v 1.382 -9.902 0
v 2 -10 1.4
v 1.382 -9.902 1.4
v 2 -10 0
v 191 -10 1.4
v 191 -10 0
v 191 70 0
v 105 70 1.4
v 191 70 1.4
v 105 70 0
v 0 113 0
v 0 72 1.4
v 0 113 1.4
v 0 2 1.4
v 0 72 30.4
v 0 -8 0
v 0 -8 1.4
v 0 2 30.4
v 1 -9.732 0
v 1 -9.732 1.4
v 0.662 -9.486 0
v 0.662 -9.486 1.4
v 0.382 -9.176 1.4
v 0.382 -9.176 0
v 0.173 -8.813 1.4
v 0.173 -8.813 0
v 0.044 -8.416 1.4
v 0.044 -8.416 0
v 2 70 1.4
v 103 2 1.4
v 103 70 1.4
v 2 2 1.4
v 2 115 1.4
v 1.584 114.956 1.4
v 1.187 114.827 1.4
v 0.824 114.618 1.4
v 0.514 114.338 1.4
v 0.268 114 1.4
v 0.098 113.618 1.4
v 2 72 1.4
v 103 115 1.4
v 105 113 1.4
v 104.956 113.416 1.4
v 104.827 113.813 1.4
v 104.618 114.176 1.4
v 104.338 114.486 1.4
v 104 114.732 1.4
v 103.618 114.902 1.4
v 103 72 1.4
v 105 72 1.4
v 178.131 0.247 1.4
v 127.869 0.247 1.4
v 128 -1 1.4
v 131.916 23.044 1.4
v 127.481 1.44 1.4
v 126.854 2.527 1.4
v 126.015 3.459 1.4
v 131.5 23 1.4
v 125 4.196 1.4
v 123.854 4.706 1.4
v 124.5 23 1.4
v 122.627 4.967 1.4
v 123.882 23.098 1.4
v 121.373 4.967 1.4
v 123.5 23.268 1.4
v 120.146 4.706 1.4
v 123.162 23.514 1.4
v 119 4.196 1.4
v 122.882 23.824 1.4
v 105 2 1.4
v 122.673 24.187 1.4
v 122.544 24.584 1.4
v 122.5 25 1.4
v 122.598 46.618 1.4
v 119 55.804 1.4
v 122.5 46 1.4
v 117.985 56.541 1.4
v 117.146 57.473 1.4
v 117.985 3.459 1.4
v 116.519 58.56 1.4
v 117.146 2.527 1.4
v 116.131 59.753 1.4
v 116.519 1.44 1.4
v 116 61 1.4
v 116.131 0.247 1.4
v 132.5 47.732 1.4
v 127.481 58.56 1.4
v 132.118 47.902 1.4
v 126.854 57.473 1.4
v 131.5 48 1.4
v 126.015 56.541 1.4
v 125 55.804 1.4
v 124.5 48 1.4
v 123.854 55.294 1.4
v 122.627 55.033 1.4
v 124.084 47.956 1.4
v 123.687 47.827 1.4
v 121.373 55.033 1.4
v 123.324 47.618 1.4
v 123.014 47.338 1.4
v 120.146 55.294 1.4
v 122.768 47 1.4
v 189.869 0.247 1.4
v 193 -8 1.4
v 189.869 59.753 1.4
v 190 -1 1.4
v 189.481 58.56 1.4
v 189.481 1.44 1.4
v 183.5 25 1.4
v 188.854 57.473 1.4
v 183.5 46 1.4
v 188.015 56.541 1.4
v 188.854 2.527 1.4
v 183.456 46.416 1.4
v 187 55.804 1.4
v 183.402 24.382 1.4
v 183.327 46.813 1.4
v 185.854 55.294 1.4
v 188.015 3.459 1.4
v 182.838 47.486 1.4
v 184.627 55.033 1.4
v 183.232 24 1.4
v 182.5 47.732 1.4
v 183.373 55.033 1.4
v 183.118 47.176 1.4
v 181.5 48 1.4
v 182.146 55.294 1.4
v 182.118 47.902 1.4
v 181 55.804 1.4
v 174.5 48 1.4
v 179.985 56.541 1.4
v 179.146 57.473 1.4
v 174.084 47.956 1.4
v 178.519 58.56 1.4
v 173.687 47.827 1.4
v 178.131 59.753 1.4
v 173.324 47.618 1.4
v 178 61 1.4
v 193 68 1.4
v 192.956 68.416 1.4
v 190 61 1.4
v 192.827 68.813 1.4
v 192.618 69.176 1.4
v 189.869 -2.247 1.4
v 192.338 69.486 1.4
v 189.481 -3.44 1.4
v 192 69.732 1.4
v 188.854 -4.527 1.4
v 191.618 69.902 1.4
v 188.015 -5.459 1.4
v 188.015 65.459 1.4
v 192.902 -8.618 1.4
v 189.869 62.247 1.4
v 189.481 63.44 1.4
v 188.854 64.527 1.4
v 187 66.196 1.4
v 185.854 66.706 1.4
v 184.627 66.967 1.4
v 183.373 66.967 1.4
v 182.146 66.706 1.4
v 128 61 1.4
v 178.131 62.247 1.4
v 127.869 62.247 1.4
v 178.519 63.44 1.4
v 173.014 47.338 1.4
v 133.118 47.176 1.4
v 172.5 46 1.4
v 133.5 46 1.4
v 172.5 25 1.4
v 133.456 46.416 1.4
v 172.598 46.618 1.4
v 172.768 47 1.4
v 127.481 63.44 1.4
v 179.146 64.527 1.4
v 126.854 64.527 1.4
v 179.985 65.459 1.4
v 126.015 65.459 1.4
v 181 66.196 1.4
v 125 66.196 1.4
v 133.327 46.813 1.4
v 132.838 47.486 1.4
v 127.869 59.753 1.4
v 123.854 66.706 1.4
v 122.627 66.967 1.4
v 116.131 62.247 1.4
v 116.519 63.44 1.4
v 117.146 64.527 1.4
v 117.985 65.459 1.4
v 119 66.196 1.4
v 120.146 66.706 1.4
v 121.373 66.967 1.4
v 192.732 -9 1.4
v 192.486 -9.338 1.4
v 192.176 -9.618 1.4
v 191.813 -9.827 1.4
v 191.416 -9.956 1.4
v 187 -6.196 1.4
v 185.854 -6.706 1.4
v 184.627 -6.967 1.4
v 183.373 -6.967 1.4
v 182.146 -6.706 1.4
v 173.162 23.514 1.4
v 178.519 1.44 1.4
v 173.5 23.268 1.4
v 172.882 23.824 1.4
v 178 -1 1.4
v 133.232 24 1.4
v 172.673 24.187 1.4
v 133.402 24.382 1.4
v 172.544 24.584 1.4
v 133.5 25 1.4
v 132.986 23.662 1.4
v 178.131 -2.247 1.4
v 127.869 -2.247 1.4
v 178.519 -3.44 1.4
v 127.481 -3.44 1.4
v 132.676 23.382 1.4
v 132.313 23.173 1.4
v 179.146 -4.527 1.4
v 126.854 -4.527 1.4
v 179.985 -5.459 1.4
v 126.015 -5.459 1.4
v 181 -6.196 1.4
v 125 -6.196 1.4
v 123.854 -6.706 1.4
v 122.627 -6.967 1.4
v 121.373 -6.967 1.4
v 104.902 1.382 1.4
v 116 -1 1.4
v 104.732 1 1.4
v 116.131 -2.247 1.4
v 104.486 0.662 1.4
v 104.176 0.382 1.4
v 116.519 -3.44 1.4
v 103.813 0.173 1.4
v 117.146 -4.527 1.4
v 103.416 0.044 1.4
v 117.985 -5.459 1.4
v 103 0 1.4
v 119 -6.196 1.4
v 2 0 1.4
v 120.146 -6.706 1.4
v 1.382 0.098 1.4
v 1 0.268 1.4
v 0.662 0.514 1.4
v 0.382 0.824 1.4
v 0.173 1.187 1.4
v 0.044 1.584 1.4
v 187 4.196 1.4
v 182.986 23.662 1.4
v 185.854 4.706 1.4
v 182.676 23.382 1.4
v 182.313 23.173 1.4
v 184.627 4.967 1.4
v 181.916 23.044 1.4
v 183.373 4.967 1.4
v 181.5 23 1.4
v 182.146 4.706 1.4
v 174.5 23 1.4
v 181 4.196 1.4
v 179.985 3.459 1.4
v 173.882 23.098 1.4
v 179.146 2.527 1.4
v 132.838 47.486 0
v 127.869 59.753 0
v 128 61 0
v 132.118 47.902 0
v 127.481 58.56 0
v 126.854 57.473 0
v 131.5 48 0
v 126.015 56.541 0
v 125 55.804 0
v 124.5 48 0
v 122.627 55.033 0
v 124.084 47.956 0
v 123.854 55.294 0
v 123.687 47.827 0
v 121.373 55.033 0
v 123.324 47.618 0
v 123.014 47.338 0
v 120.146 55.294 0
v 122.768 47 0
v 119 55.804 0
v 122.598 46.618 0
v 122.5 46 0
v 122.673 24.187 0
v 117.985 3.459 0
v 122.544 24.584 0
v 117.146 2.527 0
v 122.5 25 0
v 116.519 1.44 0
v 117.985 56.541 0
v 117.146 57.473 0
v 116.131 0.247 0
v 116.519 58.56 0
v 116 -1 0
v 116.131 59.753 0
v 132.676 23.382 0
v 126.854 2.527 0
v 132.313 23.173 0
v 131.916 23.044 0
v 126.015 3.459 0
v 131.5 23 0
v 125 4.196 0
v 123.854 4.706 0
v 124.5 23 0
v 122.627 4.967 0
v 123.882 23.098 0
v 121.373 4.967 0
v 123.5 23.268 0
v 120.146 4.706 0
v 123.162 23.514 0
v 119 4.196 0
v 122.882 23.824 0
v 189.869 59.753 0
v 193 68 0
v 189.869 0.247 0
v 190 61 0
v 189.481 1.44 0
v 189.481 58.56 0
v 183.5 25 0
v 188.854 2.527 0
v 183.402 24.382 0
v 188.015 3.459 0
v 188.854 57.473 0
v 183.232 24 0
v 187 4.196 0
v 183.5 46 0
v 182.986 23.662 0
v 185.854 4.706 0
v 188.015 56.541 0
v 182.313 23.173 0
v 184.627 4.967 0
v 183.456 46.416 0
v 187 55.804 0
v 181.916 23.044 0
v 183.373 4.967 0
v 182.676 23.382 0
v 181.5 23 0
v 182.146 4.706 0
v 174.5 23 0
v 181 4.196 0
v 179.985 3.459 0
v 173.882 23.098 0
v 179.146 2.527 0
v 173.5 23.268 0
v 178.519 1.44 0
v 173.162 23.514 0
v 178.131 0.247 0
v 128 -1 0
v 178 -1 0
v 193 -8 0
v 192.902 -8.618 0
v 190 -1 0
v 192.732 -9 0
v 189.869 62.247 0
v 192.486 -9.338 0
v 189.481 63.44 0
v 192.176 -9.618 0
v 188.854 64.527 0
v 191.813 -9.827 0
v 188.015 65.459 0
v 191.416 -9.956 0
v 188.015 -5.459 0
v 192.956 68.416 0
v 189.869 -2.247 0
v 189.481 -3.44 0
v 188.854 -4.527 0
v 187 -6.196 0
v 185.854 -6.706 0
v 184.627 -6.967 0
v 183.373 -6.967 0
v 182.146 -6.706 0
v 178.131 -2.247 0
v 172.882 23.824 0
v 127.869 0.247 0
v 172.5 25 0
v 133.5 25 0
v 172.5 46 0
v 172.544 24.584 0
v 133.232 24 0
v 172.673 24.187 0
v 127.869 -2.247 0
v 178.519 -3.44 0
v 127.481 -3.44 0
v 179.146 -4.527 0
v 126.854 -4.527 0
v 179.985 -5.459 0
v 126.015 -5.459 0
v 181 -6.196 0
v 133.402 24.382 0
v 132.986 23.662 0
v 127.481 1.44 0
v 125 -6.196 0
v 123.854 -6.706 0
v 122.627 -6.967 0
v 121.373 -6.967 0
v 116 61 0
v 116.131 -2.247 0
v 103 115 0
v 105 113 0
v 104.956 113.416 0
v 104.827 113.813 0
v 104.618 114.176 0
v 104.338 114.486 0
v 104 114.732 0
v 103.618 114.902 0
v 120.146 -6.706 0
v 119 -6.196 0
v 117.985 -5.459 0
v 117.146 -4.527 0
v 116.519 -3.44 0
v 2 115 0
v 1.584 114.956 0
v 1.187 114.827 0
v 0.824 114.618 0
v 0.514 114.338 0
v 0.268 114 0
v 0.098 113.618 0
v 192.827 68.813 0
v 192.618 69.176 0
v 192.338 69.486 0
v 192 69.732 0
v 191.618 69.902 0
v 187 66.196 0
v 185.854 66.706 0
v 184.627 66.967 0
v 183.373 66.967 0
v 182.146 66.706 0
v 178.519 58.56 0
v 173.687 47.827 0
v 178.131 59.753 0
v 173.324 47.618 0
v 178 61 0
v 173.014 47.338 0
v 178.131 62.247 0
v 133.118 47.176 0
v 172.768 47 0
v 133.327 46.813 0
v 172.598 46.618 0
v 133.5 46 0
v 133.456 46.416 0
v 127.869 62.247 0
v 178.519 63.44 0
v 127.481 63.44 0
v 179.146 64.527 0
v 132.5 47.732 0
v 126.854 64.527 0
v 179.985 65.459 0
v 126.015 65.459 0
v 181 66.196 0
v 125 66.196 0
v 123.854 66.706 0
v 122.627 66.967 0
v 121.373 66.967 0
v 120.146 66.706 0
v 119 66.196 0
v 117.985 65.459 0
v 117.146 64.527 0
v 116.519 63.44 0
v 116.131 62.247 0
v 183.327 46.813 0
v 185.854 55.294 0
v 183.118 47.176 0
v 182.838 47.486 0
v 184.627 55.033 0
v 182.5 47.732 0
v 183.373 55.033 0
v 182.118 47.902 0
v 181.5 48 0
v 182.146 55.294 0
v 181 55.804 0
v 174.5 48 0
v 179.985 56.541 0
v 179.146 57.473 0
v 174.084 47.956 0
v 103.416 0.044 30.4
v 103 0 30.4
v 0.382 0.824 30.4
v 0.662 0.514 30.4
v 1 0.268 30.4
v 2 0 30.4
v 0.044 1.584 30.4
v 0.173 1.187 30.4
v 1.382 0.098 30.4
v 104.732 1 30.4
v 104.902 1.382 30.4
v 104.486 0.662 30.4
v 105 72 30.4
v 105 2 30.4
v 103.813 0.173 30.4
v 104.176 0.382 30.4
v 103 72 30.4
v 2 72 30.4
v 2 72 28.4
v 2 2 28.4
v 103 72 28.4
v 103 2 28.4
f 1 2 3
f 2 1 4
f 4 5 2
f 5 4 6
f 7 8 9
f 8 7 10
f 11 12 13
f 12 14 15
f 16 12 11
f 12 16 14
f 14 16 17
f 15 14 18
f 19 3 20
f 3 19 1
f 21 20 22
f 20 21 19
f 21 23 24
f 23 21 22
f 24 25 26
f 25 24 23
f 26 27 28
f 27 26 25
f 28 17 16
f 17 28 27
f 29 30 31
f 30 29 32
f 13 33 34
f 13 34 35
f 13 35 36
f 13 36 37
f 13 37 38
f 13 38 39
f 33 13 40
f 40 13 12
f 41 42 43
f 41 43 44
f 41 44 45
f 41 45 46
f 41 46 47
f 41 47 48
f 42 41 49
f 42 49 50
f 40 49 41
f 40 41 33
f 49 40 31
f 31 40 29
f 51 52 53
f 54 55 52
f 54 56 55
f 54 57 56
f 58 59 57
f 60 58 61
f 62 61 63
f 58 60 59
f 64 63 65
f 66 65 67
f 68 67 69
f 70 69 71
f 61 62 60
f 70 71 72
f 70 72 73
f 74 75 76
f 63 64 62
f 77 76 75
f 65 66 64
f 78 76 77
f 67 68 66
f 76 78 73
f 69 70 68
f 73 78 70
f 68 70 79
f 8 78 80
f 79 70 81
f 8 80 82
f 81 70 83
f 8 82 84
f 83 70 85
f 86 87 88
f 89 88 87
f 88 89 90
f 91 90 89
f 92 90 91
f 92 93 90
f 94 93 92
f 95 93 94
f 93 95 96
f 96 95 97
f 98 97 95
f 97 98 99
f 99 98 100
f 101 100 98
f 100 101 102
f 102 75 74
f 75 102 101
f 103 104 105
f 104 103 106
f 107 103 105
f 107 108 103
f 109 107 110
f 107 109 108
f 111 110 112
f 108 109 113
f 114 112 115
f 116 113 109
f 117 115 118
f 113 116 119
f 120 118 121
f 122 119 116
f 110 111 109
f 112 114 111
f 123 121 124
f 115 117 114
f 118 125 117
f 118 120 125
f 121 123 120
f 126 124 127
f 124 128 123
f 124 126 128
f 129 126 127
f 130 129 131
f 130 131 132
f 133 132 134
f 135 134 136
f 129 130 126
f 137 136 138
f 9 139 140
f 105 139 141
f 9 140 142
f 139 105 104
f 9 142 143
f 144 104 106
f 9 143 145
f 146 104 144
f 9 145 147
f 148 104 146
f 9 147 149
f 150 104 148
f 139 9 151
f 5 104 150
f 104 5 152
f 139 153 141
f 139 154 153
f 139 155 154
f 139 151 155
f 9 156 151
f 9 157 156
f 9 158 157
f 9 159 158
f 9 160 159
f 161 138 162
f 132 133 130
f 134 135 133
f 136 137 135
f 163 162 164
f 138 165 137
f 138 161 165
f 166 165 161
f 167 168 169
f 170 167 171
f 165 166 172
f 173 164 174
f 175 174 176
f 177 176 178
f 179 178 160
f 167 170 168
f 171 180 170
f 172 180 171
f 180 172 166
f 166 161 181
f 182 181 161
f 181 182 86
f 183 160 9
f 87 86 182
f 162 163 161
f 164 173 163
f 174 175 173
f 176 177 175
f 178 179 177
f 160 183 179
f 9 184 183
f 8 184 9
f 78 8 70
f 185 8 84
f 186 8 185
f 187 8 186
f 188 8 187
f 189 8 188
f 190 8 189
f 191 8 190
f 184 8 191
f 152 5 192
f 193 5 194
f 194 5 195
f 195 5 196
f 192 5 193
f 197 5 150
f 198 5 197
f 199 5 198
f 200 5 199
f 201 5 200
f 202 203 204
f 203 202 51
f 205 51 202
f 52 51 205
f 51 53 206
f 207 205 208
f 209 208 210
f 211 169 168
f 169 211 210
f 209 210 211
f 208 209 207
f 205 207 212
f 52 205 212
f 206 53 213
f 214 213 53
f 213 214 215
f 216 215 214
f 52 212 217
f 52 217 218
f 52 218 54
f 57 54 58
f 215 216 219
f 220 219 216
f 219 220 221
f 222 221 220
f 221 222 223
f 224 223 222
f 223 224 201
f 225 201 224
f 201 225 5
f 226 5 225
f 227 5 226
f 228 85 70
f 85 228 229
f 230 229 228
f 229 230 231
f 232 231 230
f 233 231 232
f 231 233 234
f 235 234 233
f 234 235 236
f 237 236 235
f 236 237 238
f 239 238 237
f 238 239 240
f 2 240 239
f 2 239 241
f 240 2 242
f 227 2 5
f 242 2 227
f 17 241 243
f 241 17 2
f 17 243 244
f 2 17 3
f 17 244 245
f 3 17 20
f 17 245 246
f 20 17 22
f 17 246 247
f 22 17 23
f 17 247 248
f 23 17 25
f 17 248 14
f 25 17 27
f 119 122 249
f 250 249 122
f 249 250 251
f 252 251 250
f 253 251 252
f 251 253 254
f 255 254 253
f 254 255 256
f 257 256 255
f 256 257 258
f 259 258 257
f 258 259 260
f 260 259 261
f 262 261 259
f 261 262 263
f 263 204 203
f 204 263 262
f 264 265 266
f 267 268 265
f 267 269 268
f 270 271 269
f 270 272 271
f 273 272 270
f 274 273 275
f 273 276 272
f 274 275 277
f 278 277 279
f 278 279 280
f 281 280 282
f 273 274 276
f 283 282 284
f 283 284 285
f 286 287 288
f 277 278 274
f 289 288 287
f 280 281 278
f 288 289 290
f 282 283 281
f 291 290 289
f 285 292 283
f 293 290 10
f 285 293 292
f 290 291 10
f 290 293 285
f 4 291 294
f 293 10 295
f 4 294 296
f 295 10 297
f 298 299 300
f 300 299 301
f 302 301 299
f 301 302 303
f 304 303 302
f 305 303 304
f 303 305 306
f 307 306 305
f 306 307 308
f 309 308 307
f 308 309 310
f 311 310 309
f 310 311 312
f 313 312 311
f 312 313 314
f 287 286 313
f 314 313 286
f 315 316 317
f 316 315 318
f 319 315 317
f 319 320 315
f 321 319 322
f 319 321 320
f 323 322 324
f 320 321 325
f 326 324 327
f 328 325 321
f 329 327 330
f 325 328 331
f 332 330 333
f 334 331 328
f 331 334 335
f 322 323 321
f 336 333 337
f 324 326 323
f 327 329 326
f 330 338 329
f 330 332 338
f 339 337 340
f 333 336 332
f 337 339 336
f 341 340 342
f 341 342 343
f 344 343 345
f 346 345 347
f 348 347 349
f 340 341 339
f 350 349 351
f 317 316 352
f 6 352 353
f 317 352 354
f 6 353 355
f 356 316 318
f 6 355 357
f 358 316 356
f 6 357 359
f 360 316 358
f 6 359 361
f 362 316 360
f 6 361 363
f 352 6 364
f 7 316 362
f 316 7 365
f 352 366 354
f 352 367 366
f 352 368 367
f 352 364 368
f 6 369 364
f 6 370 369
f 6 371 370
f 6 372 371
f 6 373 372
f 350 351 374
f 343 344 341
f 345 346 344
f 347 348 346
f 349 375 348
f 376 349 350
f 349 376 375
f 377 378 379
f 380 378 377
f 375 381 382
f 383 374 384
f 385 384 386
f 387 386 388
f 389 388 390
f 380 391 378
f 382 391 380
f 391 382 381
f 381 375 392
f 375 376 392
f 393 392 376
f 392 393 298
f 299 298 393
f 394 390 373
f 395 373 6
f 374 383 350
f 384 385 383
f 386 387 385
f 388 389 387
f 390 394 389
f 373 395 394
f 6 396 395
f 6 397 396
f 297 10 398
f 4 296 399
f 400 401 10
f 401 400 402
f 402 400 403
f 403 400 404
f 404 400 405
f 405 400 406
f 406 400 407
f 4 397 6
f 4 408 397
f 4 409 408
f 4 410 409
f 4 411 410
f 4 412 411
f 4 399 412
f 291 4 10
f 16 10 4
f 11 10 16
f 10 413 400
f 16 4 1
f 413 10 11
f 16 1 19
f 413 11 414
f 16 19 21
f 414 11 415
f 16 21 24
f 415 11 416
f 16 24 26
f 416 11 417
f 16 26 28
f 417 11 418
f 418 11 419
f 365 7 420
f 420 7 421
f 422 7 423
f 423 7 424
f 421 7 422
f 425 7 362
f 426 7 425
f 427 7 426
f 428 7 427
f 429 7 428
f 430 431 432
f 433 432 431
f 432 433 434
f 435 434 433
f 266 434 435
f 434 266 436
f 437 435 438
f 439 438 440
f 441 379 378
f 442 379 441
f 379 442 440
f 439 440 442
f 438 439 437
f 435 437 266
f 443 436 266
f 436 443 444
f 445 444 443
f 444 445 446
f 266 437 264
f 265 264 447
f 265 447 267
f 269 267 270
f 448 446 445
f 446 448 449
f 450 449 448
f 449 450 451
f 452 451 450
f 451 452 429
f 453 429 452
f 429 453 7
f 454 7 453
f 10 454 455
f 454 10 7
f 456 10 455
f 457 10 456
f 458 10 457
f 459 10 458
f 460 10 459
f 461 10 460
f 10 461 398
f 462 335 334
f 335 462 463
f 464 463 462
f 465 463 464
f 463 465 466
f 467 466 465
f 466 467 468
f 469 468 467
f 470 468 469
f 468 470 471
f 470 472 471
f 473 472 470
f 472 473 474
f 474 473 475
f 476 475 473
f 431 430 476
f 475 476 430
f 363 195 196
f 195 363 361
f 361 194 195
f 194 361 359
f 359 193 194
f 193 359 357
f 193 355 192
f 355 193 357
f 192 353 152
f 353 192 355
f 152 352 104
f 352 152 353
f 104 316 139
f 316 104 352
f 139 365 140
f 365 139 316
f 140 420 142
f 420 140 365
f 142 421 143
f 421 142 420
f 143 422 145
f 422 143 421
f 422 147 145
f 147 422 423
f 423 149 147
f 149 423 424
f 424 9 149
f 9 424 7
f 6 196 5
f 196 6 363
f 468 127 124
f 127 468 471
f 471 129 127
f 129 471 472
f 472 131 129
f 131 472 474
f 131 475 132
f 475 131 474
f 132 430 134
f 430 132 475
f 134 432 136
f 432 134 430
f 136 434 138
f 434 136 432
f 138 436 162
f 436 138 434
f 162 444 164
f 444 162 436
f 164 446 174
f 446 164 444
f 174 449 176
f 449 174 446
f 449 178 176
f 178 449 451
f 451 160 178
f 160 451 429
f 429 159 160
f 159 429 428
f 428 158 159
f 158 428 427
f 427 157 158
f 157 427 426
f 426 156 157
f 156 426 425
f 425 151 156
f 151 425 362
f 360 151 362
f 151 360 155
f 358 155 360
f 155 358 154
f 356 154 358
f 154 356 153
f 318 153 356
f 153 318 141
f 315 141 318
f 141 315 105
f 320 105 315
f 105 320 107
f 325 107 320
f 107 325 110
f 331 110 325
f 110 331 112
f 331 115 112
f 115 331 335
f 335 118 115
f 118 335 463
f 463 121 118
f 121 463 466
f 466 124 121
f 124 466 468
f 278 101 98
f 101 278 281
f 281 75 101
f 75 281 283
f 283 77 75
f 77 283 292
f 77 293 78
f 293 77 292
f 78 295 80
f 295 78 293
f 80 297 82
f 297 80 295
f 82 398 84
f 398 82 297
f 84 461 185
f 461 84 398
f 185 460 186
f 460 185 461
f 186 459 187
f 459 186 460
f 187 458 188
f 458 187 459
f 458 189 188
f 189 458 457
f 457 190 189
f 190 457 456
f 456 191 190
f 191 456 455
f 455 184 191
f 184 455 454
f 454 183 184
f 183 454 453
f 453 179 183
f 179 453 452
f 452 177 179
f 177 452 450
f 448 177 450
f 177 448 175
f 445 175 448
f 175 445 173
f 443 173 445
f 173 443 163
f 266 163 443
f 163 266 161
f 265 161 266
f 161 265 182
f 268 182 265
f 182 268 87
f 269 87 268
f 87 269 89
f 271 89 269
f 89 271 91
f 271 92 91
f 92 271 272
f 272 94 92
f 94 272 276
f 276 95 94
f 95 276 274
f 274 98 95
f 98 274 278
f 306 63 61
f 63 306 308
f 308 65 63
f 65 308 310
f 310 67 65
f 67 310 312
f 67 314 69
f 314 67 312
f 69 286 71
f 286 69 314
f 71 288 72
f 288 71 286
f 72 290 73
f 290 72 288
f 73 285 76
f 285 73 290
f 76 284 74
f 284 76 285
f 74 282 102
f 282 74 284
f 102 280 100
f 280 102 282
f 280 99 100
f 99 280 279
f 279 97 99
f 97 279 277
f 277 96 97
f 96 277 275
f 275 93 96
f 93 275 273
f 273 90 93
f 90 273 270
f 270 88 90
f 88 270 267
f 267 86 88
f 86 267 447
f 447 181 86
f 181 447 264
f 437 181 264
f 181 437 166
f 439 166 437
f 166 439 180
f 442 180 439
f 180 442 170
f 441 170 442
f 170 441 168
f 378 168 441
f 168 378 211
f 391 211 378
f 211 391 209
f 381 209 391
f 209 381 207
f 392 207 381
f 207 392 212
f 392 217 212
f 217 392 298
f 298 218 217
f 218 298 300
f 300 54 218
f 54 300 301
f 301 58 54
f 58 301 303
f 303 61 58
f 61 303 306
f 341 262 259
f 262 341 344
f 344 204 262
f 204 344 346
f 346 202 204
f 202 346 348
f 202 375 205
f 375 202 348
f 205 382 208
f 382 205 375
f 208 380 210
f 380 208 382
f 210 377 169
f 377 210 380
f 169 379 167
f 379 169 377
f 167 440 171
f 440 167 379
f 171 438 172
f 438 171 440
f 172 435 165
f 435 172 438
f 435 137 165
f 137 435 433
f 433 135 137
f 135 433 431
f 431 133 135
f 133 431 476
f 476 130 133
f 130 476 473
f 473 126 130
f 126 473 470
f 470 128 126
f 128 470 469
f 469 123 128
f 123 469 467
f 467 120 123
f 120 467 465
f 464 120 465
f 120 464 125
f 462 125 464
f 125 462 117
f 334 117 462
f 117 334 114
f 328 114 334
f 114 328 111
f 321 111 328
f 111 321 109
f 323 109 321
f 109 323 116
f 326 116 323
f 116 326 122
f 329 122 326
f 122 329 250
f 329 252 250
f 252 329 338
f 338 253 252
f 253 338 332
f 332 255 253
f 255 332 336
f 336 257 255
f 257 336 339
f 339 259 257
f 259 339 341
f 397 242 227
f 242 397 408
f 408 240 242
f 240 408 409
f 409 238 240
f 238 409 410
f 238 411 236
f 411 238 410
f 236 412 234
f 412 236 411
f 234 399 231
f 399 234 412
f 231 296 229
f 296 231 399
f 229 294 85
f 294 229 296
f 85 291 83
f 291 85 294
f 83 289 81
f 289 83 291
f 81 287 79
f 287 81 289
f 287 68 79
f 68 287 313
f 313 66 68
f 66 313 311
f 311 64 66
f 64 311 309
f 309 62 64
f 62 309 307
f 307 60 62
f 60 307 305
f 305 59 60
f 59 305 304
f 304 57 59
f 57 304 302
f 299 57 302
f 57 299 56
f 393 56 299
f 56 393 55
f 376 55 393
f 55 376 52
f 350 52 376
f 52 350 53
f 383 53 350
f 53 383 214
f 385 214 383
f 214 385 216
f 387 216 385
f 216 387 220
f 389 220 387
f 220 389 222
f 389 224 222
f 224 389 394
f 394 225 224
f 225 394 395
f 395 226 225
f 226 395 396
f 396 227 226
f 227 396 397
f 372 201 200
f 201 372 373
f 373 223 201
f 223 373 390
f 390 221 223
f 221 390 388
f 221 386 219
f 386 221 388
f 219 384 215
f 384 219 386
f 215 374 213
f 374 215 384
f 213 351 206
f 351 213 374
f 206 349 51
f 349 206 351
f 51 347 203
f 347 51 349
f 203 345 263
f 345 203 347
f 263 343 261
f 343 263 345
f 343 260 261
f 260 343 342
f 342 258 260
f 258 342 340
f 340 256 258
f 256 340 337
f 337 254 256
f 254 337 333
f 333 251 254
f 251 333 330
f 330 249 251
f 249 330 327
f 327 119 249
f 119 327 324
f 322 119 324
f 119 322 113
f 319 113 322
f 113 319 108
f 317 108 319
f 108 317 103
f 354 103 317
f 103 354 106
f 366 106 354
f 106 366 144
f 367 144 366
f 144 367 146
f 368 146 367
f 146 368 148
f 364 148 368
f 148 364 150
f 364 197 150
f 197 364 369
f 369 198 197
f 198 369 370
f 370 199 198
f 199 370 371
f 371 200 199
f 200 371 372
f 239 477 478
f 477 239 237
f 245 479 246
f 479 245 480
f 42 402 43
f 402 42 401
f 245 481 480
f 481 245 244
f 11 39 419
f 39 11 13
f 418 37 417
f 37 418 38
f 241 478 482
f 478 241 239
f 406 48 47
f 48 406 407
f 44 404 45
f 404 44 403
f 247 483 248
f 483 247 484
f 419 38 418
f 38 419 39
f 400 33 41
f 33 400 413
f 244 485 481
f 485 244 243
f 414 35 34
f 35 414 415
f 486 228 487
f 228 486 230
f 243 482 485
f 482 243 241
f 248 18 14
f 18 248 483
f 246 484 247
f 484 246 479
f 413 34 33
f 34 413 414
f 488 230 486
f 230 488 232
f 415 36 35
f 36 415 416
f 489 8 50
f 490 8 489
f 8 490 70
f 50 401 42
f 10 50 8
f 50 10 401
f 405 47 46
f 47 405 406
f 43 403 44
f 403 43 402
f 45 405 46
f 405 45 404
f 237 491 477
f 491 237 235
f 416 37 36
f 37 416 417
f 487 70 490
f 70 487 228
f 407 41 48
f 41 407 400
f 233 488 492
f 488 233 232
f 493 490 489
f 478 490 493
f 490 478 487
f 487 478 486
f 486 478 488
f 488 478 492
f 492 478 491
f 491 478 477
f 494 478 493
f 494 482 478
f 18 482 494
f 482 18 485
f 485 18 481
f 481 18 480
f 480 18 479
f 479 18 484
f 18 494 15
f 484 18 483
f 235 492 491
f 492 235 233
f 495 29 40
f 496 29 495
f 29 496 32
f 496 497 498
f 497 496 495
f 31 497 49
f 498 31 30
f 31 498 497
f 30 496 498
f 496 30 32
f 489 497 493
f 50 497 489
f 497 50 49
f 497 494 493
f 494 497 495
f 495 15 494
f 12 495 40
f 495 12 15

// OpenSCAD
$fn = 30;

base_depth = 1.4;
wall_thickness = 2;

ont_width = 80; // 611B/D
// ont_width = 90; // 611Q
ont_height = 80;

ont_screw_mount = 50;
ont_screw_width = 11;
ont_screw_height = 25;
ont_screw_pos_y = 34.5;
ont_screw_round = 2;

ont_feet_d = 12;
ont_feet_margin = 3;

ups_width = 99;
ups_depth = 109;
ups_height = 25;
ups_padding = 2;

ups_tray_height = 70;

gap = 10;
offset = -10;

module ont_base() {
	linear_extrude(base_depth)
	difference() {
		// base
		offset(wall_thickness) offset(-wall_thickness)
		square([ont_width, ont_height]);
		
		// feet
		translate([ont_feet_margin + ont_feet_d / 2, ont_feet_margin + ont_feet_d / 2])
		circle(d = ont_feet_d);

		translate([ont_width - ont_feet_margin - ont_feet_d / 2, ont_feet_margin + ont_feet_d / 2])
		circle(d = ont_feet_d);

		translate([ont_width - ont_feet_margin - ont_feet_d / 2, ont_height - ont_feet_margin - ont_feet_d / 2])
		circle(d = ont_feet_d);
		
		translate([ont_feet_margin + ont_feet_d / 2, ont_height - ont_feet_margin - ont_feet_d / 2])
		circle(d = ont_feet_d);
		
		// screw holes
		offset(ont_screw_round) offset(-ont_screw_round)
		translate([ont_width / 2 - ont_screw_width / 2 - ont_screw_mount / 2, ont_height - (ont_screw_pos_y + ont_screw_height / 2)])
		square([ont_screw_width, ont_screw_height]);

		offset(ont_screw_round) offset(-ont_screw_round)
		translate([ont_width / 2 - ont_screw_width / 2 + ont_screw_mount / 2, ont_height - (ont_screw_pos_y + ont_screw_height / 2)])
		square([ont_screw_width, ont_screw_height]);
	};
}

module ups_base() {
	difference() {
		// container
		linear_extrude(base_depth + ups_height +  ups_padding + wall_thickness)
		offset(wall_thickness) offset(-wall_thickness)
		square([ups_width + 2 * wall_thickness + ups_padding, ups_depth + 2 * 
	wall_thickness + ups_padding]);

		// cut ups out
		translate([0, 0, base_depth])
		linear_extrude(ups_height + ups_padding)
		translate([wall_thickness, wall_thickness])
		square([ups_width + ups_padding, ups_depth + ups_padding]);
		
		// cut top off
		translate([-1, wall_thickness + ups_tray_height, base_depth])
		linear_extrude(ups_height + ups_padding + wall_thickness + 1)
		square([ups_width + ups_padding + 2 * wall_thickness + 2, ups_depth - ups_tray_height + ups_padding + 2 * wall_thickness + 1]);
	}

	// tray
	translate([0, 0, base_depth + ups_height + ups_padding])
	linear_extrude(wall_thickness)
	offset(wall_thickness) offset(-wall_thickness)
	square([wall_thickness + ups_width + ups_padding + wall_thickness, wall_thickness + ups_tray_height]);
}

module connector() {
	linear_extrude(base_depth)
	offset(wall_thickness) offset(-wall_thickness)
	square([ups_width + ups_padding + 2 * wall_thickness, ont_height]);

	linear_extrude(base_depth)
	translate([ups_width + ups_padding + wall_thickness, 0])
	square([gap + wall_thickness, ont_height]);

}

translate([ups_width + ups_padding + wall_thickness, offset, 0]) {
	translate([gap, 0, 0]) ont_base();

	translate([- ups_width - ups_padding - wall_thickness, 0, 0])
	connector();
}
ups_base();
